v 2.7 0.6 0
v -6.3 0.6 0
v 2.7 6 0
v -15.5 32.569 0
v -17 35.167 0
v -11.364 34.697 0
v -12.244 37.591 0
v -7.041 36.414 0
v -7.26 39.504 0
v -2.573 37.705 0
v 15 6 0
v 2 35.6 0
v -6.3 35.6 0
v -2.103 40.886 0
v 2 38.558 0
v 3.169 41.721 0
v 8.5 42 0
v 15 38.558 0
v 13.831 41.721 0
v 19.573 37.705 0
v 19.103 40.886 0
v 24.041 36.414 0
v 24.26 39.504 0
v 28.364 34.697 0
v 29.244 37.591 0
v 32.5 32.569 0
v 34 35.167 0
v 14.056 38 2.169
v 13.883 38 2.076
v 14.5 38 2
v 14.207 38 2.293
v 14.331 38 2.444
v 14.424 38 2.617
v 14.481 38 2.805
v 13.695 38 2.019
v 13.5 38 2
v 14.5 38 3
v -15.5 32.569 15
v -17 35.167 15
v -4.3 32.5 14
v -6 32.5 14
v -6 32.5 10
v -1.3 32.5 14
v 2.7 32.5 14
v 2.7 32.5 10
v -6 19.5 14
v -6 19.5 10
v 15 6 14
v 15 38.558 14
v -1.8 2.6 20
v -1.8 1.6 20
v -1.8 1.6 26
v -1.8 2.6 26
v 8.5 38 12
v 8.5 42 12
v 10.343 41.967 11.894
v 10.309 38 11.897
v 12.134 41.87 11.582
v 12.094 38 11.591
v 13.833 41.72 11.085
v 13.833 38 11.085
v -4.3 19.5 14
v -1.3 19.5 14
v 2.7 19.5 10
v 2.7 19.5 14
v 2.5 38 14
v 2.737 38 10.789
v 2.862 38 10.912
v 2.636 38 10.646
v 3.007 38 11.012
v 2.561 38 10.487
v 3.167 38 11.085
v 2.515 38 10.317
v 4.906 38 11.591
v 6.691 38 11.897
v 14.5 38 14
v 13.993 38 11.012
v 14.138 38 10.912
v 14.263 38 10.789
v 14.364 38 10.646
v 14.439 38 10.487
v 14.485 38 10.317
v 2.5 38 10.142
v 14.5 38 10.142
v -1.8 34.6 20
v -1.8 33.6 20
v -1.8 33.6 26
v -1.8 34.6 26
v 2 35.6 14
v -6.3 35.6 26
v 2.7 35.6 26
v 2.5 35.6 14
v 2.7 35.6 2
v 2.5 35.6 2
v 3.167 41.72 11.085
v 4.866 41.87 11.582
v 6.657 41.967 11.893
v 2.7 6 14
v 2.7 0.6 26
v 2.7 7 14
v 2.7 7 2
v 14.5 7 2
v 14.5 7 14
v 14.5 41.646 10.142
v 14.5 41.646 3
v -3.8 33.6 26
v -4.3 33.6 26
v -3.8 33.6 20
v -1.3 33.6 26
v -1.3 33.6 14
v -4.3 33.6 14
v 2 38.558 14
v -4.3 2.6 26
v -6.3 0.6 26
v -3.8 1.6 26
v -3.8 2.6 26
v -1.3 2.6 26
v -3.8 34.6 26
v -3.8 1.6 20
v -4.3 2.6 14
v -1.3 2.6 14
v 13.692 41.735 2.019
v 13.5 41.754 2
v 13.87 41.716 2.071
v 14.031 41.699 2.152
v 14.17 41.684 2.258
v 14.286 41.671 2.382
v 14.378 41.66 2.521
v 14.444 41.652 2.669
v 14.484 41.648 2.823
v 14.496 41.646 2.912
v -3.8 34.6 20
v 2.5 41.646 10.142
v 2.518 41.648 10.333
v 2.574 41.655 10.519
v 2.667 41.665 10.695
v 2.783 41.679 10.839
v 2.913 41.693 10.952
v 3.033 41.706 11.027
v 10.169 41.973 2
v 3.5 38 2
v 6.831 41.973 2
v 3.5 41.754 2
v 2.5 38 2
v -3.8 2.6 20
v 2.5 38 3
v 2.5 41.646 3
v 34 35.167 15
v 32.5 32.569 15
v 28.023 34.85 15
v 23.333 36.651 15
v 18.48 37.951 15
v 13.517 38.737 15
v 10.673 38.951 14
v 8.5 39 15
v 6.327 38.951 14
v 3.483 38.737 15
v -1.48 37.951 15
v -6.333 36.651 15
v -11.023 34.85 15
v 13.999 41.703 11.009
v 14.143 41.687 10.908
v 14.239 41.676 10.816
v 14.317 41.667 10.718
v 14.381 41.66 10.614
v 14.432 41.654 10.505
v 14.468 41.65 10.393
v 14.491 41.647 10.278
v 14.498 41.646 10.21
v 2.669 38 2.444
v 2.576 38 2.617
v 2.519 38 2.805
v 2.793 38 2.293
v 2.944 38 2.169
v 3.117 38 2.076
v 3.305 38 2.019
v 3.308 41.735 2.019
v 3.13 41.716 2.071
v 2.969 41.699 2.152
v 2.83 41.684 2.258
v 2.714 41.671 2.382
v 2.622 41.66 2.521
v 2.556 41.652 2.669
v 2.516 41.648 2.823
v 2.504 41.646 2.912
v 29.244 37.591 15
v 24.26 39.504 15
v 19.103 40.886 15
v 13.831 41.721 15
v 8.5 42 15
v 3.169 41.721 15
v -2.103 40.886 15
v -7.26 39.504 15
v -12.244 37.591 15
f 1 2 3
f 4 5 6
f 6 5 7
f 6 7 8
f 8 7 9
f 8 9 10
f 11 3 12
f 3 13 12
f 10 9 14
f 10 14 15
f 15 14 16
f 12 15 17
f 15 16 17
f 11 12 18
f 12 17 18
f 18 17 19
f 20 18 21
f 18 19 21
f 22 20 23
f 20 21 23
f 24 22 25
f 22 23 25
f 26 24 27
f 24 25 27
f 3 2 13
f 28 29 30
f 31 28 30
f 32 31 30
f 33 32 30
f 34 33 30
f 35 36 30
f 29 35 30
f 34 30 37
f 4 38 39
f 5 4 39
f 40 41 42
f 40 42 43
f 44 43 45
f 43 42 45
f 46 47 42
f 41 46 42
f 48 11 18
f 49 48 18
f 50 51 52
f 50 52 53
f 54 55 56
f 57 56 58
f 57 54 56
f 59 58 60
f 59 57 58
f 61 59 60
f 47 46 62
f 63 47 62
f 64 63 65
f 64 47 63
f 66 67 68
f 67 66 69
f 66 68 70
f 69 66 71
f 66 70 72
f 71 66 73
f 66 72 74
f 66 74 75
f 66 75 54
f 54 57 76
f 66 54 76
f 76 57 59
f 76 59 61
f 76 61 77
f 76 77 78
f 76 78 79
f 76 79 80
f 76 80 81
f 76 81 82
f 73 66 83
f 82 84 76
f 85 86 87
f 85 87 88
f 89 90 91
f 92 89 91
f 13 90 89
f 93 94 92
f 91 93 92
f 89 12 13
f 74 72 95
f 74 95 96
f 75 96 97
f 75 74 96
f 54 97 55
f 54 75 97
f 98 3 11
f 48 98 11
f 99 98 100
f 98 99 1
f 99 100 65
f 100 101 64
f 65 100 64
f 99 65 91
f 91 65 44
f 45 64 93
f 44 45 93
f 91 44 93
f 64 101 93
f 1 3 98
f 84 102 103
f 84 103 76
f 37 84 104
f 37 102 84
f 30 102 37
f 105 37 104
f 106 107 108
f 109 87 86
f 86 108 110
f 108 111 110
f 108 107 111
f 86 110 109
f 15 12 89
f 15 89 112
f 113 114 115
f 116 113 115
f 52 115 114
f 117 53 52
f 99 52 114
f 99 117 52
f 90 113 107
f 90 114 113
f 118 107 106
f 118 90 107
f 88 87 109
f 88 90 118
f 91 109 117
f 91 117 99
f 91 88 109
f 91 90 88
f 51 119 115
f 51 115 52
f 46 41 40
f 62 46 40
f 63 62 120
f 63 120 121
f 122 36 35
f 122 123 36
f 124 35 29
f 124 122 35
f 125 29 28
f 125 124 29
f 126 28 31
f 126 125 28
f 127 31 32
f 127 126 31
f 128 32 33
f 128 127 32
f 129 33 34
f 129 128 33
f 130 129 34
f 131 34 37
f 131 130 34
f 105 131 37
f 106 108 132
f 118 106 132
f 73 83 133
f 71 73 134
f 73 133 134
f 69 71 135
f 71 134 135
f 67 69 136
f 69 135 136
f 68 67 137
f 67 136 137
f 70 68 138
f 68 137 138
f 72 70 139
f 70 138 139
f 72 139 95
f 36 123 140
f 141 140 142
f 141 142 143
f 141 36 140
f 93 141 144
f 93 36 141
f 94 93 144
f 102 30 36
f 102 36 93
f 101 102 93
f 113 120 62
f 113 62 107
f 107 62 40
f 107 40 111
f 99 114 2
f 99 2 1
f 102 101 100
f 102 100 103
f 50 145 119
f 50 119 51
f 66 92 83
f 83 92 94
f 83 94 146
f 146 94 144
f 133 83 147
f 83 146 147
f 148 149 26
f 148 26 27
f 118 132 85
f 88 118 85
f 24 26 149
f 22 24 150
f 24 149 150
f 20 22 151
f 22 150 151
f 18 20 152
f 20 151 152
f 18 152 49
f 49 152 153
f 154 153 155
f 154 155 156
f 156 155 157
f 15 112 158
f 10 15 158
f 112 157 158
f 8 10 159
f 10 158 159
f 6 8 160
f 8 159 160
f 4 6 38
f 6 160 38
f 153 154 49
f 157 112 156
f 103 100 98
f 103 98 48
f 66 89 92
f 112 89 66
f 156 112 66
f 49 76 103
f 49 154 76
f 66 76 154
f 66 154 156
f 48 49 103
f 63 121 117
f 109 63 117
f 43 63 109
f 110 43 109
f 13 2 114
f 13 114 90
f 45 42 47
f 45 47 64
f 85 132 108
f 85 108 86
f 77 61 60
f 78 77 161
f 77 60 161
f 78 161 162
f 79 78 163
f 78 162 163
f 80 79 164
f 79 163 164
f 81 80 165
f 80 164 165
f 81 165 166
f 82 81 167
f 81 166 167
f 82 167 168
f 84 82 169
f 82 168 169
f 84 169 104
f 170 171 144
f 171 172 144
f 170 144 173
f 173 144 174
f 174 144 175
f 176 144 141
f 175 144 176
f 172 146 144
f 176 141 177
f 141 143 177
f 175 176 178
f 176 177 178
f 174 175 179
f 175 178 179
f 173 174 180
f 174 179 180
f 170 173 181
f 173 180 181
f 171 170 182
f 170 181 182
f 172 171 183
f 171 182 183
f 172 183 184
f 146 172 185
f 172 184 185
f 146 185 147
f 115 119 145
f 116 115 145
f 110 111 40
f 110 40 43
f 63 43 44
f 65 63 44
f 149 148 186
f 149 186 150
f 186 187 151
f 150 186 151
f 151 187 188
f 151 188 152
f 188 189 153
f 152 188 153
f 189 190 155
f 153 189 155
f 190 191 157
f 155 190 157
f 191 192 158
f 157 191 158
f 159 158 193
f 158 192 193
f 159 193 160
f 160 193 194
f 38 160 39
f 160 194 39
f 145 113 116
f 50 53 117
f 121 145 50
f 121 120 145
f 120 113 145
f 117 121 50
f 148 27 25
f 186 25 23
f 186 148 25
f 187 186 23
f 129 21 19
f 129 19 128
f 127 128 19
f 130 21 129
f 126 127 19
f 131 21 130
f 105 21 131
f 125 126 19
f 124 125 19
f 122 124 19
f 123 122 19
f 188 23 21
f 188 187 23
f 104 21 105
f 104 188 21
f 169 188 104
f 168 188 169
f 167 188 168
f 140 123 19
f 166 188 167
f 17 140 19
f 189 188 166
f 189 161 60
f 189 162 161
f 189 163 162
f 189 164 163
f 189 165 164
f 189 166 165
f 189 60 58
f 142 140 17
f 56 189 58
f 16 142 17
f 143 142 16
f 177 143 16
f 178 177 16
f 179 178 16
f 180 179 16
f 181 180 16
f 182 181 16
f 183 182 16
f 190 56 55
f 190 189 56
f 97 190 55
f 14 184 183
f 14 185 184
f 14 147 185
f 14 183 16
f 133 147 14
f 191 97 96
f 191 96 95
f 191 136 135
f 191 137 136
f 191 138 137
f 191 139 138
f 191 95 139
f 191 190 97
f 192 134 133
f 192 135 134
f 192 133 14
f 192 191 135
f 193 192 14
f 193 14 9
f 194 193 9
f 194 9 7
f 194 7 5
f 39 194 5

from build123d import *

# Parameters (mm, degrees)
BOX005_W                    = 10
BOX005_H                    = 13
BOX005_DEPTH                = 4
BOX004_W                    = 3
BOX004_H                    = 31
BOX004_DEPTH                = 14
BOX003_W                    = 2
BOX003_H                    = 33
BOX003_DEPTH                = 11.2
BOX002_W                    = 9
BOX002_H                    = 35
BOX002_DEPTH                = 26
EXTRUDE_DEPTH               = 5
EXTRUDE001_DEPTH            = 5
THICKNESS_T                 = 1
BOX_W                       = 12
BOX_H                       = 31
BOX_DEPTH                   = 15
BOX001_W                    = 13
BOX001_H                    = 34
BOX001_DEPTH                = 14
CYLINDER001_W               = 48
CYLINDER001_H               = 15
CYLINDER001_ANGLE           = 60
CYLINDER001_PLACEMENT_ANGLE = 60
CYLINDER_W                  = 51
CYLINDER_H                  = 15
CYLINDER_ANGLE              = 60
CYLINDER_PLACEMENT_ANGLE    = 60


with BuildPart() as servo_wall_cutaway:
    # Box005 → Box005 (new body)
    with BuildSketch(Plane(origin=(-6, 19.5, 10), x_dir=(1, 0, 0), z_dir=(0, 0, 1))):
        with Locations((5, 6.5)):
            Rectangle(BOX005_W, BOX005_H)
    extrude(amount=BOX005_DEPTH)


with BuildPart() as slot_wall_cutout2:
    # Box004 → Box004 (new body)
    with BuildSketch(Plane(origin=(-1, 7, 14), x_dir=(1, 0, 0), z_dir=(0, 0, 1))):
        with Locations((1.5, 15.5)):
            Rectangle(BOX004_W, BOX004_H)
    extrude(amount=BOX004_DEPTH)


with BuildPart() as slot_wall_cutout1:
    # Box003 → Box003 (new body)
    with BuildSketch(Plane(origin=(-0.5, 6, 20), x_dir=(1, 0, 0), z_dir=(0, 0, 1))):
        with Locations((1, 16.5)):
            Rectangle(BOX003_W, BOX003_H)
    extrude(amount=BOX003_DEPTH)


with BuildPart() as wall_slot_finished:
    # Box002 → Box002 (new body)
    with BuildSketch(Plane(origin=(-3, 5, 0), x_dir=(1, 0, 0), z_dir=(0, 0, 1))):
        with Locations((4.5, 17.5)):
            Rectangle(BOX002_W, BOX002_H)
    extrude(amount=BOX002_DEPTH)

    # Cut003: cut slot wall cutout1
    add(slot_wall_cutout1.part, mode=Mode.SUBTRACT)

    # Cut004: cut slot wall cutout2
    add(slot_wall_cutout2.part, mode=Mode.SUBTRACT)


with BuildPart() as wall_slot_finished_1:
    # Cut004 placement: moved
    add(wall_slot_finished.part.moved(Location((-3.3, -4.4, 0))))


with BuildPart() as extrude_body:
    # Common_cs → Extrude (new body)
    with BuildSketch(Plane(origin=(8.5, 45, 6), x_dir=(1, 0, 0), z_dir=(0, 1, 0))):
        with BuildLine():
            Line((5, 4), (-5, 4))
            Line((-5, 4), (-5, -3.142136))
            ThreePointArc((-5, -3.142136), (-2.53653, -3.783978), (0, -4))
            ThreePointArc((0, -4), (2.53653, -3.783978), (5, -3.142136))
            Line((5, -3.142136), (5, 4))
        make_face()
    extrude(amount=EXTRUDE_DEPTH)


with BuildPart() as extrude001:
    # Common_cs001 → Extrude001 (new body)
    with BuildSketch(Plane(origin=(8.5, 45, 6), x_dir=(1, 0, 0), z_dir=(0, 1, 0))):
        with BuildLine():
            Line((5, 4), (-5, 4))
            Line((-5, 4), (-5, -3.142136))
            ThreePointArc((-5, -3.142136), (-2.53653, -3.783978), (0, -4))
            ThreePointArc((0, -4), (2.53653, -3.783978), (5, -3.142136))
            Line((5, -3.142136), (5, 4))
        make_face()
    extrude(amount=EXTRUDE001_DEPTH)


with BuildPart() as bolt_bottle_side_opening:
    # Thickness base: copy of Extrude body
    add(extrude_body.part)

    # Thickness
    thickness_openings = [bolt_bottle_side_opening.faces().sort_by_distance(p)[0] for p in [
        (8.5, 50, 5.862901),
    ]]
    offset(amount=THICKNESS_T, openings=thickness_openings)

    # Fusion: union Extrude body, Extrude001
    add(extrude_body.part)
    add(extrude001.part)


with BuildPart() as bolt_bottle_side_opening_1:
    # Fusion placement: moved
    add(bolt_bottle_side_opening.part.moved(Location((0, -7, 1))))


with BuildPart() as pullbay:
    # Box → Box (new body)
    with BuildSketch(Plane(origin=(2.5, 7, 2), x_dir=(1, 0, 0), z_dir=(0, 0, 1))):
        with Locations((6, 15.5)):
            Rectangle(BOX_W, BOX_H)
    extrude(amount=BOX_DEPTH)


with BuildPart() as cut_bay_from_case:
    # Box001 → Box001 (new body)
    with BuildSketch(Plane(origin=(2, 6, 0), x_dir=(1, 0, 0), z_dir=(0, 0, 1))):
        with Locations((6.5, 17)):
            Rectangle(BOX001_W, BOX001_H)
    extrude(amount=BOX001_DEPTH)

    # Cut001: cut pullBay
    add(pullbay.part, mode=Mode.SUBTRACT)


with BuildPart() as bottle_wall001:
    # Cylinder001 → Cylinder001 (revolve)
    with BuildSketch(Plane.XZ):
        with Locations((24, 7.5)):
            Rectangle(CYLINDER001_W, CYLINDER001_H)
    revolve(axis=Axis((0, 0, 0), (0, 0, 1)), revolution_arc=CYLINDER001_ANGLE)


with BuildPart() as bottle_wall001_1:
    # Cylinder001 placement: moved
    add(bottle_wall001.part.moved(Location((8.5, -7, 0))).rotate(Axis((8.5, -7, 0), (0, 0, 1)), CYLINDER001_PLACEMENT_ANGLE))


with BuildPart() as cut005:
    # Cylinder → Cylinder (revolve)
    with BuildSketch(Plane.XZ):
        with Locations((25.5, 7.5)):
            Rectangle(CYLINDER_W, CYLINDER_H)
    revolve(axis=Axis((0, 0, 0), (0, 0, 1)), revolution_arc=CYLINDER_ANGLE)


with BuildPart() as cut005_1:
    # Cylinder placement: moved
    add(cut005.part.moved(Location((8.5, -7, 0))).rotate(Axis((8.5, -7, 0), (0, 0, 1)), CYLINDER_PLACEMENT_ANGLE))

    # Cut: cut bottle_wall001
    add(bottle_wall001_1.part, mode=Mode.SUBTRACT)


with BuildPart() as cut005_2:
    # Cut placement: moved
    add(cut005_1.part.moved(Location((0, -2, 0))))

    # Fusion001: union cut bay from case
    add(cut_bay_from_case.part)

    # Cut002: cut bolt_bottle_side_opening
    add(bolt_bottle_side_opening_1.part, mode=Mode.SUBTRACT)

    # Fusion002: union wall slot finished
    add(wall_slot_finished_1.part)

    # Cut005: cut servo wall cutaway
    add(servo_wall_cutaway.part, mode=Mode.SUBTRACT)


solid = cut005_2.part
